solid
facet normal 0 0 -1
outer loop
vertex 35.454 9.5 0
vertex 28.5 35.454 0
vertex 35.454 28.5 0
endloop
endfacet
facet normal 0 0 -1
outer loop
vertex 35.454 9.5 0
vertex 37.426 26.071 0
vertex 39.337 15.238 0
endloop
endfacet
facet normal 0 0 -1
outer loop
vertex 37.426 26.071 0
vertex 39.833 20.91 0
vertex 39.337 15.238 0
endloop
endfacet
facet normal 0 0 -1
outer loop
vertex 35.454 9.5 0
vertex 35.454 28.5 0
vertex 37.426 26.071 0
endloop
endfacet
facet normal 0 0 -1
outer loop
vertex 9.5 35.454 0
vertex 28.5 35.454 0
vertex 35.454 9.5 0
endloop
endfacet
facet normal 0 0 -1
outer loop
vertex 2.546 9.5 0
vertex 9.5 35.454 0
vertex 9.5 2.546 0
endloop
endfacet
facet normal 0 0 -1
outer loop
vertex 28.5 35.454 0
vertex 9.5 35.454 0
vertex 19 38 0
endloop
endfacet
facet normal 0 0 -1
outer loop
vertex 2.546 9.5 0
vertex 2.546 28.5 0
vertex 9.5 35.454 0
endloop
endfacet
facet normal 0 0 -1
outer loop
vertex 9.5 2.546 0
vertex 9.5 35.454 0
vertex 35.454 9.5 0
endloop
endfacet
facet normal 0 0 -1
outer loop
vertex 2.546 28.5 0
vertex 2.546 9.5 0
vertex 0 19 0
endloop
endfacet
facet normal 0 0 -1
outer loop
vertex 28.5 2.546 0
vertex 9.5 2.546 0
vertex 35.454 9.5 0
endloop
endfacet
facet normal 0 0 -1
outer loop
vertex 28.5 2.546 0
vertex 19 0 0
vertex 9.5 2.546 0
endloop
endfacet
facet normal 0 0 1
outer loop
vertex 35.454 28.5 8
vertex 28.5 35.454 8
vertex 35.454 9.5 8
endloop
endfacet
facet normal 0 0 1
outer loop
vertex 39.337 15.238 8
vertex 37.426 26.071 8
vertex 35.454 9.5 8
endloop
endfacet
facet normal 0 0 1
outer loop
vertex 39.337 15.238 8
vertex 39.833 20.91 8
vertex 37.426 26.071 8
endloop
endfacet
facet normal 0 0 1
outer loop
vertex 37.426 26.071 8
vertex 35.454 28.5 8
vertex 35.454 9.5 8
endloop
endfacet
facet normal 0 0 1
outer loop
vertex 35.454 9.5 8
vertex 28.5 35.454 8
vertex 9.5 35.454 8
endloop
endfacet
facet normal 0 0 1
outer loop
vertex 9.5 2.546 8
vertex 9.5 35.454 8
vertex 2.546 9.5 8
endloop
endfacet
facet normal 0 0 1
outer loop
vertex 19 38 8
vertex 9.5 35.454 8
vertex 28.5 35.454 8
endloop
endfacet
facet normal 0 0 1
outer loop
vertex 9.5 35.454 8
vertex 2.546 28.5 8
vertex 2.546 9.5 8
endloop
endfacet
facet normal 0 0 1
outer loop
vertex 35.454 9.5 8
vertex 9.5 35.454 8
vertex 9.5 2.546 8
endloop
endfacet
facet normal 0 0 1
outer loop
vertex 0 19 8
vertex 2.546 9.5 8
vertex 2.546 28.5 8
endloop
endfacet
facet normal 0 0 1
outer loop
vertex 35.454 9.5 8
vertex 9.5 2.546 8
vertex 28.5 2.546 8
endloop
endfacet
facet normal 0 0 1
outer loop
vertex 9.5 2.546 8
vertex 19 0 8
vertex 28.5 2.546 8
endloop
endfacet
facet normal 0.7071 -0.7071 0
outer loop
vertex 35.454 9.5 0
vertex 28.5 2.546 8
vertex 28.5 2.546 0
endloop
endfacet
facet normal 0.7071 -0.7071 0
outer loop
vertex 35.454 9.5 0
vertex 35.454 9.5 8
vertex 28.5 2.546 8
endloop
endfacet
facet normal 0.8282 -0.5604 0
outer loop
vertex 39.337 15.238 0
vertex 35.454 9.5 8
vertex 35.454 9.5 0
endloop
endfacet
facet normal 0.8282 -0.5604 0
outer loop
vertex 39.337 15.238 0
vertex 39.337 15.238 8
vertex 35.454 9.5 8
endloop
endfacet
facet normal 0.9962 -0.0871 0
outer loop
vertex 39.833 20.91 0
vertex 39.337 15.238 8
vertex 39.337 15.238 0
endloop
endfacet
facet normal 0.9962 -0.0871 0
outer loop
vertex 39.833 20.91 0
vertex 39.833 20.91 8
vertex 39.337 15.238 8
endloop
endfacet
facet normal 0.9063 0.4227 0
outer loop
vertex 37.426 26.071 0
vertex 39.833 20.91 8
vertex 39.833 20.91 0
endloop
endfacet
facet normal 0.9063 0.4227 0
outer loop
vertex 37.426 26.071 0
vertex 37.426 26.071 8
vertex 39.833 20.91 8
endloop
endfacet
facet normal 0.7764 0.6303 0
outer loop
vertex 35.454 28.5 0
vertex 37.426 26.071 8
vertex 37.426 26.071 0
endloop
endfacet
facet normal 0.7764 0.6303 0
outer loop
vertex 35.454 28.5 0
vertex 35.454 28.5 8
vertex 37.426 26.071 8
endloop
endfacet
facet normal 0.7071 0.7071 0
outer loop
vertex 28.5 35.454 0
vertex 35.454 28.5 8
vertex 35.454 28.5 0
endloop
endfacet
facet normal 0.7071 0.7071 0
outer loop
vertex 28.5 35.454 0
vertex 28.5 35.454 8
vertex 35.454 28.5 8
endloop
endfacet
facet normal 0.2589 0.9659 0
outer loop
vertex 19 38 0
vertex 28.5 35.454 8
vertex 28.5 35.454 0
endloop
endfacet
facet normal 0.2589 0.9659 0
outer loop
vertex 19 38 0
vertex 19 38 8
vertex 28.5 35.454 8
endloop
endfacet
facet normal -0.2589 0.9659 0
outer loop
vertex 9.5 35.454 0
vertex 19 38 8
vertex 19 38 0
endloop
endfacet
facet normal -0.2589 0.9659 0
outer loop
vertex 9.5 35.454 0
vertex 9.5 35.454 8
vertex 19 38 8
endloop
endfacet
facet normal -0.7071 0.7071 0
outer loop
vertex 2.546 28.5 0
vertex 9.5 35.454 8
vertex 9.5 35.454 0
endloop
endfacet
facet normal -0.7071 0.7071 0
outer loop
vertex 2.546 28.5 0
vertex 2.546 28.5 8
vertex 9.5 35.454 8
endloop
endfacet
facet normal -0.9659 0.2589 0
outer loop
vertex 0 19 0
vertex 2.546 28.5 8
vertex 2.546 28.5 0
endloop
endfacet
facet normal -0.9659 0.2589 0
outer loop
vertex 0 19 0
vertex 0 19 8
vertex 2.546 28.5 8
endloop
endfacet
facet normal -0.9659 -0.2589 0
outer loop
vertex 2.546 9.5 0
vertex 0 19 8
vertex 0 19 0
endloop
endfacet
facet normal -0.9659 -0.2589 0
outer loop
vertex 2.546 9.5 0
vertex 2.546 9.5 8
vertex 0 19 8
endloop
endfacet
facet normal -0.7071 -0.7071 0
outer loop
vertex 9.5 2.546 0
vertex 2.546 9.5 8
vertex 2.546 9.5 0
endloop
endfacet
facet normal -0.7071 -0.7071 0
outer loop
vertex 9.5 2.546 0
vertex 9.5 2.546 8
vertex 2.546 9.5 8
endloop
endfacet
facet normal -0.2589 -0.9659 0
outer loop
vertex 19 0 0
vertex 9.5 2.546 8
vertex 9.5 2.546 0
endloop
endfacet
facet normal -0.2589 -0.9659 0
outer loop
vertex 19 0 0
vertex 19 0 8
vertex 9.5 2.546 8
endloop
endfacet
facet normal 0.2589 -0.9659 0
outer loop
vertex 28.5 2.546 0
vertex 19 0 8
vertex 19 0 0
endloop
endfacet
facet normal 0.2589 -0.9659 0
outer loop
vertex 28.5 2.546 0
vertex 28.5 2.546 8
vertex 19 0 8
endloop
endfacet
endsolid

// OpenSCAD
$fn = 32;

// ----------------------------------------------------------------------
// Eccentric disc: step, 8 mm thick
// ----------------------------------------------------------------------

// --- parameters (mm) ---
profile_height = 8;       // extrusion height
profile_points = 14;      // points of the closed outline

profile = [[0, 19], [2.546, 9.5], [9.5, 2.546], [19, 0], [28.5, 2.546], [35.454, 9.5], [39.337, 15.238], [39.833, 20.91], [37.426, 26.071], [35.454, 28.5], [28.5, 35.454], [19, 38], [9.5, 35.454], [2.546, 28.5]];  // single closed polygon, 14 points, counter clockwise

// --- the one profile operation ---
linear_extrude(height = profile_height) polygon(points = profile);
